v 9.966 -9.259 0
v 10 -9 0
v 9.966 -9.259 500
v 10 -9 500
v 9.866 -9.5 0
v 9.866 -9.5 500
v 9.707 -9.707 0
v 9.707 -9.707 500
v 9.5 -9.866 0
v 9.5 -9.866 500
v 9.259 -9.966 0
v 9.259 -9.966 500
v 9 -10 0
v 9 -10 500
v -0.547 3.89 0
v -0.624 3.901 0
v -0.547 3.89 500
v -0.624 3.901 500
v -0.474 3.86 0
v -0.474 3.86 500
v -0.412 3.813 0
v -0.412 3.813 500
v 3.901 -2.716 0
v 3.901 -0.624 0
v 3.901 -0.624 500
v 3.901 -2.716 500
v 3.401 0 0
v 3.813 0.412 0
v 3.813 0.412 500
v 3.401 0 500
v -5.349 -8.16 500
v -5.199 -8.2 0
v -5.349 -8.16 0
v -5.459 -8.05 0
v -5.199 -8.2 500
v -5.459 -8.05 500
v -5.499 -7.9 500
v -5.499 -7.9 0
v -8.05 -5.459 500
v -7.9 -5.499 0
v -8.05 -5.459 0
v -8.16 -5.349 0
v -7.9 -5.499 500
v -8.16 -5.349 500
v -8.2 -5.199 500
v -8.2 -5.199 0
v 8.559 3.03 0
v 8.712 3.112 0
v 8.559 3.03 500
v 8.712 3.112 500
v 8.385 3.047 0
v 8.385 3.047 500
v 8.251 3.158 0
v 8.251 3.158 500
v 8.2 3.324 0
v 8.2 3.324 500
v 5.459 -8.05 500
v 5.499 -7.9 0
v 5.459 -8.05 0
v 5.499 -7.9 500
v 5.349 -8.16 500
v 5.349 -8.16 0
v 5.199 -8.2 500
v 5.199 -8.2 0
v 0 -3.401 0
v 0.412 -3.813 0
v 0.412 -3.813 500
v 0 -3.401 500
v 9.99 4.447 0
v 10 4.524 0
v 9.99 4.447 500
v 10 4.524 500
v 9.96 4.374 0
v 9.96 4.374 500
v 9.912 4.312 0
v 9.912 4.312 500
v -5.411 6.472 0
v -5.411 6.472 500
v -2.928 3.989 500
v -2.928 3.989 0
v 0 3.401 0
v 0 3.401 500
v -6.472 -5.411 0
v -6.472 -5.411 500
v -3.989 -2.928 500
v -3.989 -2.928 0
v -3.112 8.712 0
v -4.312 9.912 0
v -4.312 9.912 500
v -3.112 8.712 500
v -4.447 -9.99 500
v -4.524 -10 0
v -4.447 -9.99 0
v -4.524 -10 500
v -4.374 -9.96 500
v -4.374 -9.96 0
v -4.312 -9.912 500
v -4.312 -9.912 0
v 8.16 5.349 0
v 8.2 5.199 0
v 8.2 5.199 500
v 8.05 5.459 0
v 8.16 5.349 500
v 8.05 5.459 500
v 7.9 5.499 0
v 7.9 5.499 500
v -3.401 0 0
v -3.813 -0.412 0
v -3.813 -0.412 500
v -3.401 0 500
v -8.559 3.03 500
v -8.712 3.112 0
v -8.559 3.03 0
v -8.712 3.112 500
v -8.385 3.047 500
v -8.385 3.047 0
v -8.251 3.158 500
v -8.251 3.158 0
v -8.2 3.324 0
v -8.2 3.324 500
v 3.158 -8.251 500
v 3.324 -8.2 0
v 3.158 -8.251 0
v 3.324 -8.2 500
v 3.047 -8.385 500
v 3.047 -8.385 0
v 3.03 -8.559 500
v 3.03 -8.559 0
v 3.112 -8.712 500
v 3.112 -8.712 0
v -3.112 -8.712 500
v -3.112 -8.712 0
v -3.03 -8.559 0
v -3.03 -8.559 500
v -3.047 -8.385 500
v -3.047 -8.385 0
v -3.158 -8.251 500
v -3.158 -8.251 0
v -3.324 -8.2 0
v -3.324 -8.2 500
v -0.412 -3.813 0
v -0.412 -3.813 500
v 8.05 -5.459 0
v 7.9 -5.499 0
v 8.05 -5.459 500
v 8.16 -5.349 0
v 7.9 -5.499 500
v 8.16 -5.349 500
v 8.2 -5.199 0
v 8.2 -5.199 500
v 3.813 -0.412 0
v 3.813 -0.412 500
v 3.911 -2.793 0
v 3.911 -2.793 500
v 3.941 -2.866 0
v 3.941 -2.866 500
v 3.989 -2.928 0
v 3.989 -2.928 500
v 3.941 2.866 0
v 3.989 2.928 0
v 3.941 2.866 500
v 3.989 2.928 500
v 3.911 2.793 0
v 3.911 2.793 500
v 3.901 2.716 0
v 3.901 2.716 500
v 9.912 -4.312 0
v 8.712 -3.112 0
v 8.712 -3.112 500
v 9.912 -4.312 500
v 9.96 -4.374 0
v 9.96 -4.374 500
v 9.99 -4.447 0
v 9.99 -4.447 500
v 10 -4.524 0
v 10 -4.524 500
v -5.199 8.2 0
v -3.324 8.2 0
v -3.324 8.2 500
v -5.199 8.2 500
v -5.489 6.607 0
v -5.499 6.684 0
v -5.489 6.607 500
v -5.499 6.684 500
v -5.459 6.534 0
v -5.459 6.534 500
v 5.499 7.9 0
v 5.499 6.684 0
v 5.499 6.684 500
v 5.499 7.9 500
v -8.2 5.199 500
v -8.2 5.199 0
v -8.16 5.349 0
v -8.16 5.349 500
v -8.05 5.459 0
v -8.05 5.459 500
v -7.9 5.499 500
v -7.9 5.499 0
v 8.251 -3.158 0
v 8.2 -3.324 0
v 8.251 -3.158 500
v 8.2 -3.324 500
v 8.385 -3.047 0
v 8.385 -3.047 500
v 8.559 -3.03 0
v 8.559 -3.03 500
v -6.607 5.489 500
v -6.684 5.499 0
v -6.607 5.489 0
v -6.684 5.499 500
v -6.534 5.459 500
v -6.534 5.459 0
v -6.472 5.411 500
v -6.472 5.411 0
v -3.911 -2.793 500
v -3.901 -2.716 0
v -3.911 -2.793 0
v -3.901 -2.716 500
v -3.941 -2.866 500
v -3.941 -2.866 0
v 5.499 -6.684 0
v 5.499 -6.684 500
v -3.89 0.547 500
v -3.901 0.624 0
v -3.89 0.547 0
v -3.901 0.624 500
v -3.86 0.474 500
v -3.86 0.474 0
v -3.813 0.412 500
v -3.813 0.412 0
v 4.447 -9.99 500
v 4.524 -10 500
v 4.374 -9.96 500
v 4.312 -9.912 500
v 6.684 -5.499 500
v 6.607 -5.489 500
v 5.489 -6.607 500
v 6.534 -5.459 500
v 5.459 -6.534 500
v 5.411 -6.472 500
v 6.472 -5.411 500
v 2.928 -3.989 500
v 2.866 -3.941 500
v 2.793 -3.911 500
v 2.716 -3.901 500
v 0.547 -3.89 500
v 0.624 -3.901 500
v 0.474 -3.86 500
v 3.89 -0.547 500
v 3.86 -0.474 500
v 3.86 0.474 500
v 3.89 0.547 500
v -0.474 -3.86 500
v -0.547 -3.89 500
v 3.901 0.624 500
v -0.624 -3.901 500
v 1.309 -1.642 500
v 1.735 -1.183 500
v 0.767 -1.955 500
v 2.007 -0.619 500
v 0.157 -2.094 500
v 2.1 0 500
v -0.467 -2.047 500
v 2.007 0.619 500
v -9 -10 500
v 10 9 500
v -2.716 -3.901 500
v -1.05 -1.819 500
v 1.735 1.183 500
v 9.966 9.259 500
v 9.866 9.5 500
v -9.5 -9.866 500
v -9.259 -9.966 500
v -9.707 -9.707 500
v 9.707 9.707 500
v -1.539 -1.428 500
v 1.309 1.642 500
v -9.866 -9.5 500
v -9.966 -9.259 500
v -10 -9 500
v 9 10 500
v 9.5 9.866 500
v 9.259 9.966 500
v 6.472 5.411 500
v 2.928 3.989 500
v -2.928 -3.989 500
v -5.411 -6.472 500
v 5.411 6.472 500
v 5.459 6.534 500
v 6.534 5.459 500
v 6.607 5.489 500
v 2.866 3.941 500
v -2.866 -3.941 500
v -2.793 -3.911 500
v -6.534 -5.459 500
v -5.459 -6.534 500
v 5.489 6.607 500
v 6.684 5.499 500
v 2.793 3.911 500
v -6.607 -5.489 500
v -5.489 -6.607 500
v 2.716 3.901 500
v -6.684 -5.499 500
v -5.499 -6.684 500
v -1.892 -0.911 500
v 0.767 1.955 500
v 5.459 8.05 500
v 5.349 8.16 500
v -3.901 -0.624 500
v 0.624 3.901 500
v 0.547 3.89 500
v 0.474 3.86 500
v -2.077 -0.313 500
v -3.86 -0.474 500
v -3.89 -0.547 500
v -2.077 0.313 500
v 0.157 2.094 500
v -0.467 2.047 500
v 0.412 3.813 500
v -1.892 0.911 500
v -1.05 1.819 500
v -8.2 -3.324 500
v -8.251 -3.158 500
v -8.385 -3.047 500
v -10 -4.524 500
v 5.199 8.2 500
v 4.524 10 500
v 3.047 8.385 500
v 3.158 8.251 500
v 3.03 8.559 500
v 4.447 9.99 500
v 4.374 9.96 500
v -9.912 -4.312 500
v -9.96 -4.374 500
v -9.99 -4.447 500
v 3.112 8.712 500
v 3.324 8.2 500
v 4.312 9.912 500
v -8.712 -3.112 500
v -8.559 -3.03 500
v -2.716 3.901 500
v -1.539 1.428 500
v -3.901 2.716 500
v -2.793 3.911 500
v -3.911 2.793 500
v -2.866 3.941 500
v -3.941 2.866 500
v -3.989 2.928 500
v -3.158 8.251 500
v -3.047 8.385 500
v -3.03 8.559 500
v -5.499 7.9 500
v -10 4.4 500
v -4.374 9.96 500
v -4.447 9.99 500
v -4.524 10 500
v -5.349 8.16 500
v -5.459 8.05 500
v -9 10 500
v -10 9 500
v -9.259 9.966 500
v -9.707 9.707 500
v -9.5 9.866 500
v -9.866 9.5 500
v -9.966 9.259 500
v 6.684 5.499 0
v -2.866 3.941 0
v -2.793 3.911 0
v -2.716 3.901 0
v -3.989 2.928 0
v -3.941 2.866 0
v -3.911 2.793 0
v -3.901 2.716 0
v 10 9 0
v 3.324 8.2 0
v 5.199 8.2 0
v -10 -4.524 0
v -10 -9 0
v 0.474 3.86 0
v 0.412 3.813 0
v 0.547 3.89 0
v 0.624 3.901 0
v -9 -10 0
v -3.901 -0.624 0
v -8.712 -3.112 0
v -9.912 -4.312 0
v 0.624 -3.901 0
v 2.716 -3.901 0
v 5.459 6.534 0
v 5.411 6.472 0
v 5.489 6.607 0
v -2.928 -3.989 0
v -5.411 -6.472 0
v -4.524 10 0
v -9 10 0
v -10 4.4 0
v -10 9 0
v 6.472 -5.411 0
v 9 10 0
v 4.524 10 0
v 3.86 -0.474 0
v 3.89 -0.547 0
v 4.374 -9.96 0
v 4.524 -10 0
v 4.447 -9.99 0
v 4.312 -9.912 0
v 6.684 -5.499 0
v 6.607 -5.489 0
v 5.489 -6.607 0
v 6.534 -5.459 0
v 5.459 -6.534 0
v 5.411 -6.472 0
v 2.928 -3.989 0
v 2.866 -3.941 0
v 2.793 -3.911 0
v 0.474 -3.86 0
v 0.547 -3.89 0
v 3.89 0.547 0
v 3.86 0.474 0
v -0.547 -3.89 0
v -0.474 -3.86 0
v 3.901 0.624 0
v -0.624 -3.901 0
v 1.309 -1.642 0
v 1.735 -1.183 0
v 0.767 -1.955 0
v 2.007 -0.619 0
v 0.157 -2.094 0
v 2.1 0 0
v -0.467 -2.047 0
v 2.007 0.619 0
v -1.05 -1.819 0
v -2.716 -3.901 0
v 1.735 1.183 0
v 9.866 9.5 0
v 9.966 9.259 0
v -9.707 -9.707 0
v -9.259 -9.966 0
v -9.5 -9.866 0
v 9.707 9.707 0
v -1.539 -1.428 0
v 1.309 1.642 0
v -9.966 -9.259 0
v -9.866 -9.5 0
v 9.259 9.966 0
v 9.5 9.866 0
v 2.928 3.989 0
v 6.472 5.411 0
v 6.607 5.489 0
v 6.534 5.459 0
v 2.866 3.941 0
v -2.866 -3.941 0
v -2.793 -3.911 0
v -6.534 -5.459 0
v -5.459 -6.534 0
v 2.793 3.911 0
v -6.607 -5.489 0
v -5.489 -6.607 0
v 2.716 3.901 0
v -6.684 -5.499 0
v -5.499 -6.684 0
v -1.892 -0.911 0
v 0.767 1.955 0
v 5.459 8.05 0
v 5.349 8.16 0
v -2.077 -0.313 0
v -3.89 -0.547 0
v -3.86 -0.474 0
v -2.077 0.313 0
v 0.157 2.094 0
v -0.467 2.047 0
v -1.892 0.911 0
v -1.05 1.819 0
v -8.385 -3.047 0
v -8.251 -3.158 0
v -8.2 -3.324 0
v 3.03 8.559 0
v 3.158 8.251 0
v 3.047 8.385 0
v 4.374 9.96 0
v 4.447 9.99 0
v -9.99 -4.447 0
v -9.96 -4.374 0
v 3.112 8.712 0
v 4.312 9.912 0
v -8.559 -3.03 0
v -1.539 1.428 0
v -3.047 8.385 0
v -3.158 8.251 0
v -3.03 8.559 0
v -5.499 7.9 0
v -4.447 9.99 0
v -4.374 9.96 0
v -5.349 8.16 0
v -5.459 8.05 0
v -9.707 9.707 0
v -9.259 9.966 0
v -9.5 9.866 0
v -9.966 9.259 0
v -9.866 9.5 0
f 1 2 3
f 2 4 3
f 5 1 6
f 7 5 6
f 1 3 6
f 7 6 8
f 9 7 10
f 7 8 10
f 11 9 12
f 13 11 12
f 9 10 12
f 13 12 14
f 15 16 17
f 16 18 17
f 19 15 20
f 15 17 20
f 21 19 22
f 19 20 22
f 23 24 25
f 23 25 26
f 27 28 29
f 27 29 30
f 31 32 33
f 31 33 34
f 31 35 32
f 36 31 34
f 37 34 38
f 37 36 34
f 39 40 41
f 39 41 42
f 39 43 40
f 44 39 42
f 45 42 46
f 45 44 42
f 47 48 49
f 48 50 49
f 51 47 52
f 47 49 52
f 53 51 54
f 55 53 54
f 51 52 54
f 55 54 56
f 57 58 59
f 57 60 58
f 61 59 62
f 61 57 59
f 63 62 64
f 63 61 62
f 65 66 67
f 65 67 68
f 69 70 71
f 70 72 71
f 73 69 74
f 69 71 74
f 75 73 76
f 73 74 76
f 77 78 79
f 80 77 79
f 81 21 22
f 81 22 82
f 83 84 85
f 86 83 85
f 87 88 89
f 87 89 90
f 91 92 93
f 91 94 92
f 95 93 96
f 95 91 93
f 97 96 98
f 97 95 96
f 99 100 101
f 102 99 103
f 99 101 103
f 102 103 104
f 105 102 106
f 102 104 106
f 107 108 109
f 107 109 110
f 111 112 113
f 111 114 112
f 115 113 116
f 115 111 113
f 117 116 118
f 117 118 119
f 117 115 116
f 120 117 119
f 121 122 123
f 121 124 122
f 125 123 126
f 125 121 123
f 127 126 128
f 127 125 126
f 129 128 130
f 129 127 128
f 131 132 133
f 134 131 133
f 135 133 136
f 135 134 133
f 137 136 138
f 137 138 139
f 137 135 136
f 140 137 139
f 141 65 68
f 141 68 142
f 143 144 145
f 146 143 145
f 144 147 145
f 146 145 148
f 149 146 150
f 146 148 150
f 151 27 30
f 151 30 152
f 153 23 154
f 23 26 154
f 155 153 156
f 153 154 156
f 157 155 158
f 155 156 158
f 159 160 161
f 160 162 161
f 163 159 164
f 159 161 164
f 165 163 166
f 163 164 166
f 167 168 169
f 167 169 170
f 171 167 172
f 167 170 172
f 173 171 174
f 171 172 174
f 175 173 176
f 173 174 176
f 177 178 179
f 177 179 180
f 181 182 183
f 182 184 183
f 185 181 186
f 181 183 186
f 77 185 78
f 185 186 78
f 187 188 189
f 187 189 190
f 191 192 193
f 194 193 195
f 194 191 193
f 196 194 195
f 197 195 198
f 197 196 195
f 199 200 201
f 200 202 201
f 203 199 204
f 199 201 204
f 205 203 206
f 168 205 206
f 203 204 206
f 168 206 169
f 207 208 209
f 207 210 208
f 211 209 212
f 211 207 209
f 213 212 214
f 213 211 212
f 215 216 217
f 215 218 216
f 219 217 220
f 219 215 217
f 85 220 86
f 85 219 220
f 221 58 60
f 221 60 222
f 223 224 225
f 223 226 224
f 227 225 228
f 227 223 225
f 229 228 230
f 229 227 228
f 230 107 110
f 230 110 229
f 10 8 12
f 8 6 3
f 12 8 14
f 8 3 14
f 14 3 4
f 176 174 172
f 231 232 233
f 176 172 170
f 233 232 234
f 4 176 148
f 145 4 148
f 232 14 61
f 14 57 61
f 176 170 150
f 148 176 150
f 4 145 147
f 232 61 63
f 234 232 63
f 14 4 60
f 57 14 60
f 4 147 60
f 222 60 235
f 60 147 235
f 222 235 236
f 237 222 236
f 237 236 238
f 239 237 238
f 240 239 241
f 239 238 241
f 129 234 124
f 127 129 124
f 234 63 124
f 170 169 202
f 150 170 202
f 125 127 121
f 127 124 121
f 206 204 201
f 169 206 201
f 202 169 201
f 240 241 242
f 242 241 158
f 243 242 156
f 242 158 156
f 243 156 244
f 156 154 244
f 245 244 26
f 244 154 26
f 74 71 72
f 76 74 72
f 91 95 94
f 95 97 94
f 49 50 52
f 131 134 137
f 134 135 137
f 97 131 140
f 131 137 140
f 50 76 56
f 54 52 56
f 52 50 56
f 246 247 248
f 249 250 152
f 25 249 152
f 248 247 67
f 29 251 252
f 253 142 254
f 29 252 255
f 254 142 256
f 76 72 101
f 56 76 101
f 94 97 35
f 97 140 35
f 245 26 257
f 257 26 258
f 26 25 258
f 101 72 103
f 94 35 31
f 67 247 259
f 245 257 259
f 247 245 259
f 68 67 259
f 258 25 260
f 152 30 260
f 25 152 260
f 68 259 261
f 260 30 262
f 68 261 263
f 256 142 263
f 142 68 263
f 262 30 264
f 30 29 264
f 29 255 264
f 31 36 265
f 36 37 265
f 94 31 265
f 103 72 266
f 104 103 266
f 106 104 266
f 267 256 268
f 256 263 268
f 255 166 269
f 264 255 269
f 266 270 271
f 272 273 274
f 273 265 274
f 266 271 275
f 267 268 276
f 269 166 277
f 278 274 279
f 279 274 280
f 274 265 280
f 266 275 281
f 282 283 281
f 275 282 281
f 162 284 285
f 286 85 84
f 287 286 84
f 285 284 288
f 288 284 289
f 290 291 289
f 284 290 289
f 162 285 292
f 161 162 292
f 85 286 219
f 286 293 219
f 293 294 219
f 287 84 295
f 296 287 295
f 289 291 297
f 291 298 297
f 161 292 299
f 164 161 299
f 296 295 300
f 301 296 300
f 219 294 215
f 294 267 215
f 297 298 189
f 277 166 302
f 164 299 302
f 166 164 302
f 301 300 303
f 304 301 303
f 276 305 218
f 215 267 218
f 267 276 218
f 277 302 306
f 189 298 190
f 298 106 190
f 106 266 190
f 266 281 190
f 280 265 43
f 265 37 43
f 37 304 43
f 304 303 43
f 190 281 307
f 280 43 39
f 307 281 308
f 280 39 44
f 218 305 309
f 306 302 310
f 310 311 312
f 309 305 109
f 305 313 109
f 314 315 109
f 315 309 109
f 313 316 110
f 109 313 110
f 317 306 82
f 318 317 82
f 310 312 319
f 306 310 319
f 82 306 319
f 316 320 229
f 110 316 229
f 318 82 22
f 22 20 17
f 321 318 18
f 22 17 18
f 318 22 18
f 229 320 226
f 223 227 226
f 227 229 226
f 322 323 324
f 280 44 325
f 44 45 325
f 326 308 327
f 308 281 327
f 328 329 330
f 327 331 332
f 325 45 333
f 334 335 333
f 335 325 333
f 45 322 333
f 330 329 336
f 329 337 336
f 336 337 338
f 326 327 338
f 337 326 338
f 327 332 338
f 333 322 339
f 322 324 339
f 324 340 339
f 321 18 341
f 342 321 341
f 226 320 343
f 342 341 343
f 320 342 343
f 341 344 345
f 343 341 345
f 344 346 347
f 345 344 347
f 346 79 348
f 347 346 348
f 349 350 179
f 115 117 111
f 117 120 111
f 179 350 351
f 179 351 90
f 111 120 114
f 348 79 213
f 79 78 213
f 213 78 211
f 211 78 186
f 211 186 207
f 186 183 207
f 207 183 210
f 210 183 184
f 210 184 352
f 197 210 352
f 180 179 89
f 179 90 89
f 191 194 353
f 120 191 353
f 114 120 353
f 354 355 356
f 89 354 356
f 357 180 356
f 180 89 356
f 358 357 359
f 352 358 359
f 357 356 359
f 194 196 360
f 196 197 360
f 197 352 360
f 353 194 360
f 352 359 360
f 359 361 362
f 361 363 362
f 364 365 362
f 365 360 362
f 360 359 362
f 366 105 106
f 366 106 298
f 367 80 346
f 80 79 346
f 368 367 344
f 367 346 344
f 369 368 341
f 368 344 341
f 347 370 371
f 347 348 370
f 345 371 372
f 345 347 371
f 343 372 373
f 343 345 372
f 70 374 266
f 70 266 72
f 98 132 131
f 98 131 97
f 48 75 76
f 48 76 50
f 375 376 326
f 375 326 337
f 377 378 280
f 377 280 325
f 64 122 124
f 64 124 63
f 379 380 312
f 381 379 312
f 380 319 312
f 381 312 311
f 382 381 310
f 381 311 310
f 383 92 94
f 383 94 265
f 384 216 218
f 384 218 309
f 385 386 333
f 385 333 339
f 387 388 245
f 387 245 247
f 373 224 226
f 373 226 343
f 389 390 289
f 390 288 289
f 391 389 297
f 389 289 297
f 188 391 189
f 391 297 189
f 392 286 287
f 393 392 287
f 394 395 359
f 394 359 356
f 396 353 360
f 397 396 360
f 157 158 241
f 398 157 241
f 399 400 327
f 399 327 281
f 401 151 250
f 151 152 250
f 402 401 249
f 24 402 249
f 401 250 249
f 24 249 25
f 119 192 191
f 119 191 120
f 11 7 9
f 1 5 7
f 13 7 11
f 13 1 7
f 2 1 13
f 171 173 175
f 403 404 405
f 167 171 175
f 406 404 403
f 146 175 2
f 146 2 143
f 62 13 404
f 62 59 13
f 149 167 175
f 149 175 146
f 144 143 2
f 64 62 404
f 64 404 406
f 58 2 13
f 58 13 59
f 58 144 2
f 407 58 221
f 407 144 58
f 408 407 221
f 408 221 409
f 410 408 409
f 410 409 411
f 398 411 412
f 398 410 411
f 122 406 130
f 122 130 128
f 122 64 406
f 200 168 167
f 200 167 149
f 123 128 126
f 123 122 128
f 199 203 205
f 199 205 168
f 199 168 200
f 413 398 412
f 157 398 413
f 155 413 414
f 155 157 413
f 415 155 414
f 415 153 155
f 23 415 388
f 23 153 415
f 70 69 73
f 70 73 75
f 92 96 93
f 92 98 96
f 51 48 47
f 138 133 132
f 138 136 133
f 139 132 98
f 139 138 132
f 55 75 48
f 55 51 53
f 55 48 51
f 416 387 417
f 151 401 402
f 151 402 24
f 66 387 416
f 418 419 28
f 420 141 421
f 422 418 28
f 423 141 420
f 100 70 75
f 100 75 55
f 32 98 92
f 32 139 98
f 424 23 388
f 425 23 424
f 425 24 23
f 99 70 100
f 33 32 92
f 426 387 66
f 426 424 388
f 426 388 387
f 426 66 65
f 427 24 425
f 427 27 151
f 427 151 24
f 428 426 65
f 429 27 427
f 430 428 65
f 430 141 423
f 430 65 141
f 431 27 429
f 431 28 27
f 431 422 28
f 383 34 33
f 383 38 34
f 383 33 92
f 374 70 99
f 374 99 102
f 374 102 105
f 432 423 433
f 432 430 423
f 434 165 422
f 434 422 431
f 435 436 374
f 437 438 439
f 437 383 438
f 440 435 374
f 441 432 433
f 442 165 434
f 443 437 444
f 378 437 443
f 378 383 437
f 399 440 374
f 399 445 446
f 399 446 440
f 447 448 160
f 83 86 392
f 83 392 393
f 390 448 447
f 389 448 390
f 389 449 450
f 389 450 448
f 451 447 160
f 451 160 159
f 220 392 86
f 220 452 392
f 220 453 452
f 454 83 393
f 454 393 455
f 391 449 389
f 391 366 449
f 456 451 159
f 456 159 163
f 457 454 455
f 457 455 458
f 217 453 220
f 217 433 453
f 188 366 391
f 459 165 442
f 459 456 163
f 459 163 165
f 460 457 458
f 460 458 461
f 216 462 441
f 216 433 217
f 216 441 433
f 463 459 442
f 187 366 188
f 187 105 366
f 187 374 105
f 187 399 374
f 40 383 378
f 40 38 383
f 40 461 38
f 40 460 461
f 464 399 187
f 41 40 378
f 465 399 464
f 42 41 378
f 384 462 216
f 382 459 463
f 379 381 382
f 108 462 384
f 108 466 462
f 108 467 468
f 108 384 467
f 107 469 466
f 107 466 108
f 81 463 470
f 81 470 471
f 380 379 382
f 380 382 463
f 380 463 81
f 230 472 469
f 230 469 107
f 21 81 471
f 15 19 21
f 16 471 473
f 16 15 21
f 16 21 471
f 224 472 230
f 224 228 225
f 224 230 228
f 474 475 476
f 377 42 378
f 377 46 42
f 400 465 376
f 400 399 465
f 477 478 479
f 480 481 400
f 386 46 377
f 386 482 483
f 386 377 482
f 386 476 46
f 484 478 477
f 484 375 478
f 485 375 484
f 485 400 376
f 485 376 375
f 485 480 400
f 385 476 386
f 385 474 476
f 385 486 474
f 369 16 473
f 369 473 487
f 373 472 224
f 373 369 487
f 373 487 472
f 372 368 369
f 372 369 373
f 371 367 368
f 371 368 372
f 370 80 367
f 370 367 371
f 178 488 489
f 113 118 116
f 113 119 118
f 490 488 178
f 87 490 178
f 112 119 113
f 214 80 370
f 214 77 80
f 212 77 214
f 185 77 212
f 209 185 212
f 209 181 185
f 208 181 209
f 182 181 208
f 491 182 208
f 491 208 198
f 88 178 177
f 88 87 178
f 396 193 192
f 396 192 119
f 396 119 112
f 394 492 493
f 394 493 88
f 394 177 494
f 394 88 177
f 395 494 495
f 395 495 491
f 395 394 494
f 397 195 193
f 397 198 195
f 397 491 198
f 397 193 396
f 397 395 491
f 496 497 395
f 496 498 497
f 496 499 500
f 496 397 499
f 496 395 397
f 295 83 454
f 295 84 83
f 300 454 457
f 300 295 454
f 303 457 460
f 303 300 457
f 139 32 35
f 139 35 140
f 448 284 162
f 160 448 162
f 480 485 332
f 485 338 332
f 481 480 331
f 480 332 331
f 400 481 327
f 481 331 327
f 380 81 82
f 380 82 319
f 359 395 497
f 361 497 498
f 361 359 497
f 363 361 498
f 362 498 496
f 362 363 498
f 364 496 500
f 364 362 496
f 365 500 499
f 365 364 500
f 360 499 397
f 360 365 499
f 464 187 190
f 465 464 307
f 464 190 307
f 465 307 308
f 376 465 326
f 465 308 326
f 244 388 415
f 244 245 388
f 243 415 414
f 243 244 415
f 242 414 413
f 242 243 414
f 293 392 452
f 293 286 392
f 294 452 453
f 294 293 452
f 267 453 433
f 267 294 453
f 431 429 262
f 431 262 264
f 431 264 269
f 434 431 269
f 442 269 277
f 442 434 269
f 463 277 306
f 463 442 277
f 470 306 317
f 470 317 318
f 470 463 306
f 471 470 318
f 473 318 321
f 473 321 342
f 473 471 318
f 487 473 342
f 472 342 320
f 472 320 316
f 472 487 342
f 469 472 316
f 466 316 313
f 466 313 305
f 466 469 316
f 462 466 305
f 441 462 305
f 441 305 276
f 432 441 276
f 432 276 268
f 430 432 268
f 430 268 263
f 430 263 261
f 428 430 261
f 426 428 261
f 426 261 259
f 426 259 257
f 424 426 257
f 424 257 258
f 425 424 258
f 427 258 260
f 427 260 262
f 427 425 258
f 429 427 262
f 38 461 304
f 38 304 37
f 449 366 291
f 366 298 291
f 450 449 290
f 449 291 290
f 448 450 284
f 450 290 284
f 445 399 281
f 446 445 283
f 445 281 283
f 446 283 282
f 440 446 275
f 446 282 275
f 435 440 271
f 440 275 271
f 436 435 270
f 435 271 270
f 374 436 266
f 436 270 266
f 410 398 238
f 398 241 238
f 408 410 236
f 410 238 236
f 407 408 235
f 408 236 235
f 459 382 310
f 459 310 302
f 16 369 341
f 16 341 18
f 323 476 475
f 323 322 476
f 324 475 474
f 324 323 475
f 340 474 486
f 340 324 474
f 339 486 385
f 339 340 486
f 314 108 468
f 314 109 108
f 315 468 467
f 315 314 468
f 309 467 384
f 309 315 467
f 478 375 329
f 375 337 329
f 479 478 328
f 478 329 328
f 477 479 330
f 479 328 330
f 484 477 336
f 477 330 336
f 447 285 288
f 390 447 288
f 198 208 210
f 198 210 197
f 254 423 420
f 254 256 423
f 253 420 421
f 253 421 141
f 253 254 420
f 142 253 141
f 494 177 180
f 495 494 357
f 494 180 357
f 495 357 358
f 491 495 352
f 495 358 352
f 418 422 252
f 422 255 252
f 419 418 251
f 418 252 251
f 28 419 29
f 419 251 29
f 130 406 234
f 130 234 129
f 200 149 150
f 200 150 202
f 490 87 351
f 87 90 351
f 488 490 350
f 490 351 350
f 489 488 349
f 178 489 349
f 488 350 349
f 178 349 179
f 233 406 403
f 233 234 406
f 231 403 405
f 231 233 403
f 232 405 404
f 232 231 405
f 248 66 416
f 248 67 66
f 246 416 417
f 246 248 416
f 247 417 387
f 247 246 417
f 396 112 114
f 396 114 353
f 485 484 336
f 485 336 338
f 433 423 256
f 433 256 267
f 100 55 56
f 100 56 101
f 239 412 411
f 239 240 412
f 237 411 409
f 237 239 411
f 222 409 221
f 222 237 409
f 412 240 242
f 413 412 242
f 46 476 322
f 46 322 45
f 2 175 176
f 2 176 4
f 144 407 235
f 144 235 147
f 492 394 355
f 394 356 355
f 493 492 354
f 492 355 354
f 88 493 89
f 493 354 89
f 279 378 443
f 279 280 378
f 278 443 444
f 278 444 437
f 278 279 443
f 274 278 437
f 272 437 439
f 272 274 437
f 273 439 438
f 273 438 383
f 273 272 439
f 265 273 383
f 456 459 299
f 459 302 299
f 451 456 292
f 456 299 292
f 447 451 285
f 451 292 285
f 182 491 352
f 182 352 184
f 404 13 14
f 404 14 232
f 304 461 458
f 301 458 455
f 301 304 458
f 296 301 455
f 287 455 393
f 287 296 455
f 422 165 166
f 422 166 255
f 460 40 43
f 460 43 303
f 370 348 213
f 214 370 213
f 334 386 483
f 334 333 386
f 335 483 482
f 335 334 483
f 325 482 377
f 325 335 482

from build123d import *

# Parameters (mm, degrees)
SKETCH_1_R      = 2.1
EXTRUDE_1_DEPTH = 500
FILLET_1_R      = 1
FILLET_2_R      = 0.3


with BuildPart() as part:
    # Эскиз1 → Бобышка-Вытянуть1 (new body)
    with BuildSketch(Plane.XY):
        Polygon((-10, 10), (-4.4, 10), (-2.6, 8.2), (-5.499339828, 8.2), (-5.499339828, 6.56), (-2.84, 3.900660172), (-0.5, 3.900660172), (0, 3.400660172), (0.5, 3.900660172), (2.84, 3.900660172), (5.499339828, 6.56), (5.499339828, 8.2), (2.6, 8.2), (4.4, 10), (10, 10), (10, 4.4), (8.2, 2.6), (8.2, 5.499339828), (6.56, 5.499339828), (3.900660172, 2.84), (3.900660172, 0.5), (3.400660172, 0), (3.900660172, -0.5), (3.900660172, -2.84), (6.56, -5.499339828), (8.2, -5.499339828), (8.2, -2.6), (10, -4.4), (10, -10), (4.4, -10), (2.6, -8.2), (5.499339828, -8.2), (5.499339828, -6.56), (2.84, -3.900660172), (0.5, -3.900660172), (0, -3.400660172), (-0.5, -3.900660172), (-2.84, -3.900660172), (-5.499339828, -6.56), (-5.499339828, -8.2), (-2.6, -8.2), (-4.4, -10), (-10, -10), (-10, -4.4), (-8.2, -2.6), (-8.2, -5.499339828), (-6.56, -5.499339828), (-3.900660172, -2.84), (-3.900660172, -0.5), (-3.400660172, 0), (-3.900660172, 0.5), (-3.900660172, 2.84), (-6.56, 5.499339828), (-8.2, 5.499339828), (-8.2, 2.6), (-10, 4.4), align=None)
        Circle(SKETCH_1_R, mode=Mode.SUBTRACT)
    extrude(amount=EXTRUDE_1_DEPTH)

    # Скругление1
    fillet_1_edges = [part.edges().sort_by_distance(p)[0] for p in [
        (-10, 10, 250),
        (10, 10, 250),
        (10, -10, 250),
        (-10, -10, 250),
    ]]
    fillet(fillet_1_edges, radius=FILLET_1_R)

    # Скругление2
    fillet_2_edges = [part.edges().sort_by_distance(p)[0] for p in [
        (-4.4, 10, 250),
        (-2.6, 8.2, 250),
        (-5.499339828, 8.2, 250),
        (-5.499339828, 6.56, 250),
        (-2.84, 3.900660172, 250),
        (-0.5, 3.900660172, 250),
        (0.5, 3.900660172, 250),
        (2.84, 3.900660172, 250),
        (5.499339828, 6.56, 250),
        (5.499339828, 8.2, 250),
        (2.6, 8.2, 250),
        (4.4, 10, 250),
        (10, 4.4, 250),
        (8.2, 2.6, 250),
        (8.2, 5.499339828, 250),
        (6.56, 5.499339828, 250),
        (3.900660172, 2.84, 250),
        (3.900660172, 0.5, 250),
        (3.900660172, -0.5, 250),
        (3.900660172, -2.84, 250),
        (6.56, -5.499339828, 250),
        (8.2, -5.499339828, 250),
        (8.2, -2.6, 250),
        (10, -4.4, 250),
        (4.4, -10, 250),
        (2.6, -8.2, 250),
        (5.499339828, -8.2, 250),
        (5.499339828, -6.56, 250),
        (2.84, -3.900660172, 250),
        (0.5, -3.900660172, 250),
        (-0.5, -3.900660172, 250),
        (-2.84, -3.900660172, 250),
        (-5.499339828, -6.56, 250),
        (-5.499339828, -8.2, 250),
        (-2.6, -8.2, 250),
        (-4.4, -10, 250),
        (-10, -4.4, 250),
        (-8.2, -2.6, 250),
        (-8.2, -5.499339828, 250),
        (-6.56, -5.499339828, 250),
        (-3.900660172, -2.84, 250),
        (-3.900660172, -0.5, 250),
        (-3.900660172, 0.5, 250),
        (-3.900660172, 2.84, 250),
        (-6.56, 5.499339828, 250),
        (-8.2, 5.499339828, 250),
        (-8.2, 2.6, 250),
    ]]
    fillet(fillet_2_edges, radius=FILLET_2_R)


solid = part.part
